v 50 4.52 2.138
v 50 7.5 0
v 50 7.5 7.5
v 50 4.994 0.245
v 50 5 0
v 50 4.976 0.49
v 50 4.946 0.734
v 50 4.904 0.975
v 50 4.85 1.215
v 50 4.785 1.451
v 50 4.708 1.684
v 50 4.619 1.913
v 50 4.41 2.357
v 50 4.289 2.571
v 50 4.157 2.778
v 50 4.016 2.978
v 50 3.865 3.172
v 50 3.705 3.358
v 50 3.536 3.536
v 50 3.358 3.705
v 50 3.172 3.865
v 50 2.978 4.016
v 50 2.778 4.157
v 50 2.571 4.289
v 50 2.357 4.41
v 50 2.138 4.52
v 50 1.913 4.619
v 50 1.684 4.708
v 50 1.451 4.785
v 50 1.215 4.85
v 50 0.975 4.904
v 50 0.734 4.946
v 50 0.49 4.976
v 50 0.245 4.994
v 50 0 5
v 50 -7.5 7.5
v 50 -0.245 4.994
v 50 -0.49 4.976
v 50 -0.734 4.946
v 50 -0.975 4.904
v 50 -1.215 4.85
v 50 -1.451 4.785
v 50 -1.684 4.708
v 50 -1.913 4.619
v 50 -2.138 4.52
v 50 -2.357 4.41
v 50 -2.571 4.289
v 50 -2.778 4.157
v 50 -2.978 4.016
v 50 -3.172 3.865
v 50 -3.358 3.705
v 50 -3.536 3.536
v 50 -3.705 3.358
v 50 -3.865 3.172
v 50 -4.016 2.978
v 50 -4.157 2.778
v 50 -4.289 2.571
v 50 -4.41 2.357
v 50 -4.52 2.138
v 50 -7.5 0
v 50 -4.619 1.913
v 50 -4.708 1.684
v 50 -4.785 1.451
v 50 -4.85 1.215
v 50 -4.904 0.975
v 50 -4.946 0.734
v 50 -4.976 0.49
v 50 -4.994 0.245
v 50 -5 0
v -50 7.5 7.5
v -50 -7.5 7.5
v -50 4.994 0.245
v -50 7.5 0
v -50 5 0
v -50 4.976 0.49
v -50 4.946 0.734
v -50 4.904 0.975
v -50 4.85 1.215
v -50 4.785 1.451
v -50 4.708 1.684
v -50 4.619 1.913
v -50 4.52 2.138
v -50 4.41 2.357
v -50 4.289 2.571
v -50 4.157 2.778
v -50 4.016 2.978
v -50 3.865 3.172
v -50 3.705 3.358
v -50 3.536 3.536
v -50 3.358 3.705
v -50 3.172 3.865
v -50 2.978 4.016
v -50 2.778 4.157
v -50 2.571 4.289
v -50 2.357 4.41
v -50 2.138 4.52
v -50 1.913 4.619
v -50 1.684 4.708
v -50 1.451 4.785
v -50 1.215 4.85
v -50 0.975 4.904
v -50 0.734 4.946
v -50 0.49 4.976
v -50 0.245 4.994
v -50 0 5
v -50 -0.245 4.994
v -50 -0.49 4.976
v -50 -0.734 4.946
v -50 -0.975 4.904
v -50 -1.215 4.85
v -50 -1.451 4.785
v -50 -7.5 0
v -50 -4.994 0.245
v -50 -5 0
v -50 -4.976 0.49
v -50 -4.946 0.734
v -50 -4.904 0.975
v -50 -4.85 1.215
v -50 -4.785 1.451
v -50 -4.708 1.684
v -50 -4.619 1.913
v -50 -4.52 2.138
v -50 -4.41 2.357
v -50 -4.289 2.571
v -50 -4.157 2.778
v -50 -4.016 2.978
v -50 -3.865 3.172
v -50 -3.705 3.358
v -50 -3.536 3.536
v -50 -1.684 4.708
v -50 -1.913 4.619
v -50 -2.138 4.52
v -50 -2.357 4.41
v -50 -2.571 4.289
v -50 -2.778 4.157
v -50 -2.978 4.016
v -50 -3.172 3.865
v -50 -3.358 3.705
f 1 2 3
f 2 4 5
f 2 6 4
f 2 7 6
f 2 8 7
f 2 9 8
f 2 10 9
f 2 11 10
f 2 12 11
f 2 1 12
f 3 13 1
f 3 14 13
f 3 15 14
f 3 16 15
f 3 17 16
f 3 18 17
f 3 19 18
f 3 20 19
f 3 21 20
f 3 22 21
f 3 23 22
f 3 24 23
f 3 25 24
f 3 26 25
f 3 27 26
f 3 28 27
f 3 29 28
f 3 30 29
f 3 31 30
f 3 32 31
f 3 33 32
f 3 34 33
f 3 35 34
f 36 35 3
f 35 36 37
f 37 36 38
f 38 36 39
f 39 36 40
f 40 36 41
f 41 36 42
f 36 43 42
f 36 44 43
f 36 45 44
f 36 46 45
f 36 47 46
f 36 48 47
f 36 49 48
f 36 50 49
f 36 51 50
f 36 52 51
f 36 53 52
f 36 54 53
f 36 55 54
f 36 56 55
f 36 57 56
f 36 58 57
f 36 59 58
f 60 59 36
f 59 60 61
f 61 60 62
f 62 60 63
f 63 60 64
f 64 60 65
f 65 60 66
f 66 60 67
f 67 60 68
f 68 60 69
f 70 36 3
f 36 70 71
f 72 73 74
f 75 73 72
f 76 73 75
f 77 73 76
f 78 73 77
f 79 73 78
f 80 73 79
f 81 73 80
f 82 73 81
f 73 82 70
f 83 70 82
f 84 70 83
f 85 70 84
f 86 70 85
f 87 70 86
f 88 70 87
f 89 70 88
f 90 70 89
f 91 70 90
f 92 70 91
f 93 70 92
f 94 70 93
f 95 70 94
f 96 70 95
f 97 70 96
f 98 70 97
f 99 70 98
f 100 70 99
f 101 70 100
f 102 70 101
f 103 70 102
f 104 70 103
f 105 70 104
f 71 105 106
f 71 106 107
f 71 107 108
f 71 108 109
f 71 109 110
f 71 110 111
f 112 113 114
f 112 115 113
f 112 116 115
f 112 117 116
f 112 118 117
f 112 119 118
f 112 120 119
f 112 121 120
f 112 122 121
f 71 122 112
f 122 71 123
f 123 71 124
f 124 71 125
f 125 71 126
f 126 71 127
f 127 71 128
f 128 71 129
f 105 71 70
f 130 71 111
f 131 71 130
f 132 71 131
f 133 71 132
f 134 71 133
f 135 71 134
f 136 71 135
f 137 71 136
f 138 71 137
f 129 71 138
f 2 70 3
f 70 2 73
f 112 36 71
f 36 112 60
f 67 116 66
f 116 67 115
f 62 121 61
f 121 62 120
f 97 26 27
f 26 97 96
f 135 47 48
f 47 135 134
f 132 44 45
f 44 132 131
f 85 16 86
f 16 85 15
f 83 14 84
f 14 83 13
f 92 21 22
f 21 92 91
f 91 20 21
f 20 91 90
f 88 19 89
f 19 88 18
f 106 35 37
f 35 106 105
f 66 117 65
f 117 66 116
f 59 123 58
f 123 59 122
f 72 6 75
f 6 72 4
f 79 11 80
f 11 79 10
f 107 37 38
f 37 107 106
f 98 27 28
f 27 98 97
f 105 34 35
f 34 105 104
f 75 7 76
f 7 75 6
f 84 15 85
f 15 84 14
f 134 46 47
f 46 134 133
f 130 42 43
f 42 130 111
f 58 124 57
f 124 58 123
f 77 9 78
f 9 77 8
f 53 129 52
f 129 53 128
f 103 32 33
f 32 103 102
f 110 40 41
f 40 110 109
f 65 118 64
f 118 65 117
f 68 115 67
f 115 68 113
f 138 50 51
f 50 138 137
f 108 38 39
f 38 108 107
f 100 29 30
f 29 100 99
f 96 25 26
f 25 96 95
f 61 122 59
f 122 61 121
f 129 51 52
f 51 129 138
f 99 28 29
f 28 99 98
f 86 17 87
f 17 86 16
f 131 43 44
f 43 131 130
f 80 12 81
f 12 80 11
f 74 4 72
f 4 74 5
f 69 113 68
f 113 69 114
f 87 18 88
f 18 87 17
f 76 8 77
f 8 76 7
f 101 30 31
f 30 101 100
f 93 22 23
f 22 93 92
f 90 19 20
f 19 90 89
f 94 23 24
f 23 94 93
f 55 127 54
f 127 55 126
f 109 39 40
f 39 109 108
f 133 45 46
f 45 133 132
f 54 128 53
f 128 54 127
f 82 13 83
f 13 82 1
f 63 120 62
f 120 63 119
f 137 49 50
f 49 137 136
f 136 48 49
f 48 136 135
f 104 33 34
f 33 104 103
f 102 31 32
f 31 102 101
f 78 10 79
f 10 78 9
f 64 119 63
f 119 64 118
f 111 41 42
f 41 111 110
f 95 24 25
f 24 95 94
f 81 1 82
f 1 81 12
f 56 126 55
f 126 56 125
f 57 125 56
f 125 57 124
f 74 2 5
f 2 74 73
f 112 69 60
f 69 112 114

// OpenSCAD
module MdoRoundItOnXaxis(dim_long, hole_diam, square_width)
{
    difference() {
        translate([-dim_long/2, -square_width/2, -square_width/2]) cube([dim_long, square_width, square_width]);
        rotate([0, 90, 0]) translate([0, 0, -(dim_long+2)/2])cylinder(r=hole_diam/2,h=dim_long+2,$fn=128);
        translate([-dim_long/2-1, -square_width/2-1, -square_width-2]) cube([dim_long+2, square_width+2, square_width+2]);
    }
}   // end MdoRoundItOnXaxis()

MdoRoundItOnXaxis(100,10,15);
